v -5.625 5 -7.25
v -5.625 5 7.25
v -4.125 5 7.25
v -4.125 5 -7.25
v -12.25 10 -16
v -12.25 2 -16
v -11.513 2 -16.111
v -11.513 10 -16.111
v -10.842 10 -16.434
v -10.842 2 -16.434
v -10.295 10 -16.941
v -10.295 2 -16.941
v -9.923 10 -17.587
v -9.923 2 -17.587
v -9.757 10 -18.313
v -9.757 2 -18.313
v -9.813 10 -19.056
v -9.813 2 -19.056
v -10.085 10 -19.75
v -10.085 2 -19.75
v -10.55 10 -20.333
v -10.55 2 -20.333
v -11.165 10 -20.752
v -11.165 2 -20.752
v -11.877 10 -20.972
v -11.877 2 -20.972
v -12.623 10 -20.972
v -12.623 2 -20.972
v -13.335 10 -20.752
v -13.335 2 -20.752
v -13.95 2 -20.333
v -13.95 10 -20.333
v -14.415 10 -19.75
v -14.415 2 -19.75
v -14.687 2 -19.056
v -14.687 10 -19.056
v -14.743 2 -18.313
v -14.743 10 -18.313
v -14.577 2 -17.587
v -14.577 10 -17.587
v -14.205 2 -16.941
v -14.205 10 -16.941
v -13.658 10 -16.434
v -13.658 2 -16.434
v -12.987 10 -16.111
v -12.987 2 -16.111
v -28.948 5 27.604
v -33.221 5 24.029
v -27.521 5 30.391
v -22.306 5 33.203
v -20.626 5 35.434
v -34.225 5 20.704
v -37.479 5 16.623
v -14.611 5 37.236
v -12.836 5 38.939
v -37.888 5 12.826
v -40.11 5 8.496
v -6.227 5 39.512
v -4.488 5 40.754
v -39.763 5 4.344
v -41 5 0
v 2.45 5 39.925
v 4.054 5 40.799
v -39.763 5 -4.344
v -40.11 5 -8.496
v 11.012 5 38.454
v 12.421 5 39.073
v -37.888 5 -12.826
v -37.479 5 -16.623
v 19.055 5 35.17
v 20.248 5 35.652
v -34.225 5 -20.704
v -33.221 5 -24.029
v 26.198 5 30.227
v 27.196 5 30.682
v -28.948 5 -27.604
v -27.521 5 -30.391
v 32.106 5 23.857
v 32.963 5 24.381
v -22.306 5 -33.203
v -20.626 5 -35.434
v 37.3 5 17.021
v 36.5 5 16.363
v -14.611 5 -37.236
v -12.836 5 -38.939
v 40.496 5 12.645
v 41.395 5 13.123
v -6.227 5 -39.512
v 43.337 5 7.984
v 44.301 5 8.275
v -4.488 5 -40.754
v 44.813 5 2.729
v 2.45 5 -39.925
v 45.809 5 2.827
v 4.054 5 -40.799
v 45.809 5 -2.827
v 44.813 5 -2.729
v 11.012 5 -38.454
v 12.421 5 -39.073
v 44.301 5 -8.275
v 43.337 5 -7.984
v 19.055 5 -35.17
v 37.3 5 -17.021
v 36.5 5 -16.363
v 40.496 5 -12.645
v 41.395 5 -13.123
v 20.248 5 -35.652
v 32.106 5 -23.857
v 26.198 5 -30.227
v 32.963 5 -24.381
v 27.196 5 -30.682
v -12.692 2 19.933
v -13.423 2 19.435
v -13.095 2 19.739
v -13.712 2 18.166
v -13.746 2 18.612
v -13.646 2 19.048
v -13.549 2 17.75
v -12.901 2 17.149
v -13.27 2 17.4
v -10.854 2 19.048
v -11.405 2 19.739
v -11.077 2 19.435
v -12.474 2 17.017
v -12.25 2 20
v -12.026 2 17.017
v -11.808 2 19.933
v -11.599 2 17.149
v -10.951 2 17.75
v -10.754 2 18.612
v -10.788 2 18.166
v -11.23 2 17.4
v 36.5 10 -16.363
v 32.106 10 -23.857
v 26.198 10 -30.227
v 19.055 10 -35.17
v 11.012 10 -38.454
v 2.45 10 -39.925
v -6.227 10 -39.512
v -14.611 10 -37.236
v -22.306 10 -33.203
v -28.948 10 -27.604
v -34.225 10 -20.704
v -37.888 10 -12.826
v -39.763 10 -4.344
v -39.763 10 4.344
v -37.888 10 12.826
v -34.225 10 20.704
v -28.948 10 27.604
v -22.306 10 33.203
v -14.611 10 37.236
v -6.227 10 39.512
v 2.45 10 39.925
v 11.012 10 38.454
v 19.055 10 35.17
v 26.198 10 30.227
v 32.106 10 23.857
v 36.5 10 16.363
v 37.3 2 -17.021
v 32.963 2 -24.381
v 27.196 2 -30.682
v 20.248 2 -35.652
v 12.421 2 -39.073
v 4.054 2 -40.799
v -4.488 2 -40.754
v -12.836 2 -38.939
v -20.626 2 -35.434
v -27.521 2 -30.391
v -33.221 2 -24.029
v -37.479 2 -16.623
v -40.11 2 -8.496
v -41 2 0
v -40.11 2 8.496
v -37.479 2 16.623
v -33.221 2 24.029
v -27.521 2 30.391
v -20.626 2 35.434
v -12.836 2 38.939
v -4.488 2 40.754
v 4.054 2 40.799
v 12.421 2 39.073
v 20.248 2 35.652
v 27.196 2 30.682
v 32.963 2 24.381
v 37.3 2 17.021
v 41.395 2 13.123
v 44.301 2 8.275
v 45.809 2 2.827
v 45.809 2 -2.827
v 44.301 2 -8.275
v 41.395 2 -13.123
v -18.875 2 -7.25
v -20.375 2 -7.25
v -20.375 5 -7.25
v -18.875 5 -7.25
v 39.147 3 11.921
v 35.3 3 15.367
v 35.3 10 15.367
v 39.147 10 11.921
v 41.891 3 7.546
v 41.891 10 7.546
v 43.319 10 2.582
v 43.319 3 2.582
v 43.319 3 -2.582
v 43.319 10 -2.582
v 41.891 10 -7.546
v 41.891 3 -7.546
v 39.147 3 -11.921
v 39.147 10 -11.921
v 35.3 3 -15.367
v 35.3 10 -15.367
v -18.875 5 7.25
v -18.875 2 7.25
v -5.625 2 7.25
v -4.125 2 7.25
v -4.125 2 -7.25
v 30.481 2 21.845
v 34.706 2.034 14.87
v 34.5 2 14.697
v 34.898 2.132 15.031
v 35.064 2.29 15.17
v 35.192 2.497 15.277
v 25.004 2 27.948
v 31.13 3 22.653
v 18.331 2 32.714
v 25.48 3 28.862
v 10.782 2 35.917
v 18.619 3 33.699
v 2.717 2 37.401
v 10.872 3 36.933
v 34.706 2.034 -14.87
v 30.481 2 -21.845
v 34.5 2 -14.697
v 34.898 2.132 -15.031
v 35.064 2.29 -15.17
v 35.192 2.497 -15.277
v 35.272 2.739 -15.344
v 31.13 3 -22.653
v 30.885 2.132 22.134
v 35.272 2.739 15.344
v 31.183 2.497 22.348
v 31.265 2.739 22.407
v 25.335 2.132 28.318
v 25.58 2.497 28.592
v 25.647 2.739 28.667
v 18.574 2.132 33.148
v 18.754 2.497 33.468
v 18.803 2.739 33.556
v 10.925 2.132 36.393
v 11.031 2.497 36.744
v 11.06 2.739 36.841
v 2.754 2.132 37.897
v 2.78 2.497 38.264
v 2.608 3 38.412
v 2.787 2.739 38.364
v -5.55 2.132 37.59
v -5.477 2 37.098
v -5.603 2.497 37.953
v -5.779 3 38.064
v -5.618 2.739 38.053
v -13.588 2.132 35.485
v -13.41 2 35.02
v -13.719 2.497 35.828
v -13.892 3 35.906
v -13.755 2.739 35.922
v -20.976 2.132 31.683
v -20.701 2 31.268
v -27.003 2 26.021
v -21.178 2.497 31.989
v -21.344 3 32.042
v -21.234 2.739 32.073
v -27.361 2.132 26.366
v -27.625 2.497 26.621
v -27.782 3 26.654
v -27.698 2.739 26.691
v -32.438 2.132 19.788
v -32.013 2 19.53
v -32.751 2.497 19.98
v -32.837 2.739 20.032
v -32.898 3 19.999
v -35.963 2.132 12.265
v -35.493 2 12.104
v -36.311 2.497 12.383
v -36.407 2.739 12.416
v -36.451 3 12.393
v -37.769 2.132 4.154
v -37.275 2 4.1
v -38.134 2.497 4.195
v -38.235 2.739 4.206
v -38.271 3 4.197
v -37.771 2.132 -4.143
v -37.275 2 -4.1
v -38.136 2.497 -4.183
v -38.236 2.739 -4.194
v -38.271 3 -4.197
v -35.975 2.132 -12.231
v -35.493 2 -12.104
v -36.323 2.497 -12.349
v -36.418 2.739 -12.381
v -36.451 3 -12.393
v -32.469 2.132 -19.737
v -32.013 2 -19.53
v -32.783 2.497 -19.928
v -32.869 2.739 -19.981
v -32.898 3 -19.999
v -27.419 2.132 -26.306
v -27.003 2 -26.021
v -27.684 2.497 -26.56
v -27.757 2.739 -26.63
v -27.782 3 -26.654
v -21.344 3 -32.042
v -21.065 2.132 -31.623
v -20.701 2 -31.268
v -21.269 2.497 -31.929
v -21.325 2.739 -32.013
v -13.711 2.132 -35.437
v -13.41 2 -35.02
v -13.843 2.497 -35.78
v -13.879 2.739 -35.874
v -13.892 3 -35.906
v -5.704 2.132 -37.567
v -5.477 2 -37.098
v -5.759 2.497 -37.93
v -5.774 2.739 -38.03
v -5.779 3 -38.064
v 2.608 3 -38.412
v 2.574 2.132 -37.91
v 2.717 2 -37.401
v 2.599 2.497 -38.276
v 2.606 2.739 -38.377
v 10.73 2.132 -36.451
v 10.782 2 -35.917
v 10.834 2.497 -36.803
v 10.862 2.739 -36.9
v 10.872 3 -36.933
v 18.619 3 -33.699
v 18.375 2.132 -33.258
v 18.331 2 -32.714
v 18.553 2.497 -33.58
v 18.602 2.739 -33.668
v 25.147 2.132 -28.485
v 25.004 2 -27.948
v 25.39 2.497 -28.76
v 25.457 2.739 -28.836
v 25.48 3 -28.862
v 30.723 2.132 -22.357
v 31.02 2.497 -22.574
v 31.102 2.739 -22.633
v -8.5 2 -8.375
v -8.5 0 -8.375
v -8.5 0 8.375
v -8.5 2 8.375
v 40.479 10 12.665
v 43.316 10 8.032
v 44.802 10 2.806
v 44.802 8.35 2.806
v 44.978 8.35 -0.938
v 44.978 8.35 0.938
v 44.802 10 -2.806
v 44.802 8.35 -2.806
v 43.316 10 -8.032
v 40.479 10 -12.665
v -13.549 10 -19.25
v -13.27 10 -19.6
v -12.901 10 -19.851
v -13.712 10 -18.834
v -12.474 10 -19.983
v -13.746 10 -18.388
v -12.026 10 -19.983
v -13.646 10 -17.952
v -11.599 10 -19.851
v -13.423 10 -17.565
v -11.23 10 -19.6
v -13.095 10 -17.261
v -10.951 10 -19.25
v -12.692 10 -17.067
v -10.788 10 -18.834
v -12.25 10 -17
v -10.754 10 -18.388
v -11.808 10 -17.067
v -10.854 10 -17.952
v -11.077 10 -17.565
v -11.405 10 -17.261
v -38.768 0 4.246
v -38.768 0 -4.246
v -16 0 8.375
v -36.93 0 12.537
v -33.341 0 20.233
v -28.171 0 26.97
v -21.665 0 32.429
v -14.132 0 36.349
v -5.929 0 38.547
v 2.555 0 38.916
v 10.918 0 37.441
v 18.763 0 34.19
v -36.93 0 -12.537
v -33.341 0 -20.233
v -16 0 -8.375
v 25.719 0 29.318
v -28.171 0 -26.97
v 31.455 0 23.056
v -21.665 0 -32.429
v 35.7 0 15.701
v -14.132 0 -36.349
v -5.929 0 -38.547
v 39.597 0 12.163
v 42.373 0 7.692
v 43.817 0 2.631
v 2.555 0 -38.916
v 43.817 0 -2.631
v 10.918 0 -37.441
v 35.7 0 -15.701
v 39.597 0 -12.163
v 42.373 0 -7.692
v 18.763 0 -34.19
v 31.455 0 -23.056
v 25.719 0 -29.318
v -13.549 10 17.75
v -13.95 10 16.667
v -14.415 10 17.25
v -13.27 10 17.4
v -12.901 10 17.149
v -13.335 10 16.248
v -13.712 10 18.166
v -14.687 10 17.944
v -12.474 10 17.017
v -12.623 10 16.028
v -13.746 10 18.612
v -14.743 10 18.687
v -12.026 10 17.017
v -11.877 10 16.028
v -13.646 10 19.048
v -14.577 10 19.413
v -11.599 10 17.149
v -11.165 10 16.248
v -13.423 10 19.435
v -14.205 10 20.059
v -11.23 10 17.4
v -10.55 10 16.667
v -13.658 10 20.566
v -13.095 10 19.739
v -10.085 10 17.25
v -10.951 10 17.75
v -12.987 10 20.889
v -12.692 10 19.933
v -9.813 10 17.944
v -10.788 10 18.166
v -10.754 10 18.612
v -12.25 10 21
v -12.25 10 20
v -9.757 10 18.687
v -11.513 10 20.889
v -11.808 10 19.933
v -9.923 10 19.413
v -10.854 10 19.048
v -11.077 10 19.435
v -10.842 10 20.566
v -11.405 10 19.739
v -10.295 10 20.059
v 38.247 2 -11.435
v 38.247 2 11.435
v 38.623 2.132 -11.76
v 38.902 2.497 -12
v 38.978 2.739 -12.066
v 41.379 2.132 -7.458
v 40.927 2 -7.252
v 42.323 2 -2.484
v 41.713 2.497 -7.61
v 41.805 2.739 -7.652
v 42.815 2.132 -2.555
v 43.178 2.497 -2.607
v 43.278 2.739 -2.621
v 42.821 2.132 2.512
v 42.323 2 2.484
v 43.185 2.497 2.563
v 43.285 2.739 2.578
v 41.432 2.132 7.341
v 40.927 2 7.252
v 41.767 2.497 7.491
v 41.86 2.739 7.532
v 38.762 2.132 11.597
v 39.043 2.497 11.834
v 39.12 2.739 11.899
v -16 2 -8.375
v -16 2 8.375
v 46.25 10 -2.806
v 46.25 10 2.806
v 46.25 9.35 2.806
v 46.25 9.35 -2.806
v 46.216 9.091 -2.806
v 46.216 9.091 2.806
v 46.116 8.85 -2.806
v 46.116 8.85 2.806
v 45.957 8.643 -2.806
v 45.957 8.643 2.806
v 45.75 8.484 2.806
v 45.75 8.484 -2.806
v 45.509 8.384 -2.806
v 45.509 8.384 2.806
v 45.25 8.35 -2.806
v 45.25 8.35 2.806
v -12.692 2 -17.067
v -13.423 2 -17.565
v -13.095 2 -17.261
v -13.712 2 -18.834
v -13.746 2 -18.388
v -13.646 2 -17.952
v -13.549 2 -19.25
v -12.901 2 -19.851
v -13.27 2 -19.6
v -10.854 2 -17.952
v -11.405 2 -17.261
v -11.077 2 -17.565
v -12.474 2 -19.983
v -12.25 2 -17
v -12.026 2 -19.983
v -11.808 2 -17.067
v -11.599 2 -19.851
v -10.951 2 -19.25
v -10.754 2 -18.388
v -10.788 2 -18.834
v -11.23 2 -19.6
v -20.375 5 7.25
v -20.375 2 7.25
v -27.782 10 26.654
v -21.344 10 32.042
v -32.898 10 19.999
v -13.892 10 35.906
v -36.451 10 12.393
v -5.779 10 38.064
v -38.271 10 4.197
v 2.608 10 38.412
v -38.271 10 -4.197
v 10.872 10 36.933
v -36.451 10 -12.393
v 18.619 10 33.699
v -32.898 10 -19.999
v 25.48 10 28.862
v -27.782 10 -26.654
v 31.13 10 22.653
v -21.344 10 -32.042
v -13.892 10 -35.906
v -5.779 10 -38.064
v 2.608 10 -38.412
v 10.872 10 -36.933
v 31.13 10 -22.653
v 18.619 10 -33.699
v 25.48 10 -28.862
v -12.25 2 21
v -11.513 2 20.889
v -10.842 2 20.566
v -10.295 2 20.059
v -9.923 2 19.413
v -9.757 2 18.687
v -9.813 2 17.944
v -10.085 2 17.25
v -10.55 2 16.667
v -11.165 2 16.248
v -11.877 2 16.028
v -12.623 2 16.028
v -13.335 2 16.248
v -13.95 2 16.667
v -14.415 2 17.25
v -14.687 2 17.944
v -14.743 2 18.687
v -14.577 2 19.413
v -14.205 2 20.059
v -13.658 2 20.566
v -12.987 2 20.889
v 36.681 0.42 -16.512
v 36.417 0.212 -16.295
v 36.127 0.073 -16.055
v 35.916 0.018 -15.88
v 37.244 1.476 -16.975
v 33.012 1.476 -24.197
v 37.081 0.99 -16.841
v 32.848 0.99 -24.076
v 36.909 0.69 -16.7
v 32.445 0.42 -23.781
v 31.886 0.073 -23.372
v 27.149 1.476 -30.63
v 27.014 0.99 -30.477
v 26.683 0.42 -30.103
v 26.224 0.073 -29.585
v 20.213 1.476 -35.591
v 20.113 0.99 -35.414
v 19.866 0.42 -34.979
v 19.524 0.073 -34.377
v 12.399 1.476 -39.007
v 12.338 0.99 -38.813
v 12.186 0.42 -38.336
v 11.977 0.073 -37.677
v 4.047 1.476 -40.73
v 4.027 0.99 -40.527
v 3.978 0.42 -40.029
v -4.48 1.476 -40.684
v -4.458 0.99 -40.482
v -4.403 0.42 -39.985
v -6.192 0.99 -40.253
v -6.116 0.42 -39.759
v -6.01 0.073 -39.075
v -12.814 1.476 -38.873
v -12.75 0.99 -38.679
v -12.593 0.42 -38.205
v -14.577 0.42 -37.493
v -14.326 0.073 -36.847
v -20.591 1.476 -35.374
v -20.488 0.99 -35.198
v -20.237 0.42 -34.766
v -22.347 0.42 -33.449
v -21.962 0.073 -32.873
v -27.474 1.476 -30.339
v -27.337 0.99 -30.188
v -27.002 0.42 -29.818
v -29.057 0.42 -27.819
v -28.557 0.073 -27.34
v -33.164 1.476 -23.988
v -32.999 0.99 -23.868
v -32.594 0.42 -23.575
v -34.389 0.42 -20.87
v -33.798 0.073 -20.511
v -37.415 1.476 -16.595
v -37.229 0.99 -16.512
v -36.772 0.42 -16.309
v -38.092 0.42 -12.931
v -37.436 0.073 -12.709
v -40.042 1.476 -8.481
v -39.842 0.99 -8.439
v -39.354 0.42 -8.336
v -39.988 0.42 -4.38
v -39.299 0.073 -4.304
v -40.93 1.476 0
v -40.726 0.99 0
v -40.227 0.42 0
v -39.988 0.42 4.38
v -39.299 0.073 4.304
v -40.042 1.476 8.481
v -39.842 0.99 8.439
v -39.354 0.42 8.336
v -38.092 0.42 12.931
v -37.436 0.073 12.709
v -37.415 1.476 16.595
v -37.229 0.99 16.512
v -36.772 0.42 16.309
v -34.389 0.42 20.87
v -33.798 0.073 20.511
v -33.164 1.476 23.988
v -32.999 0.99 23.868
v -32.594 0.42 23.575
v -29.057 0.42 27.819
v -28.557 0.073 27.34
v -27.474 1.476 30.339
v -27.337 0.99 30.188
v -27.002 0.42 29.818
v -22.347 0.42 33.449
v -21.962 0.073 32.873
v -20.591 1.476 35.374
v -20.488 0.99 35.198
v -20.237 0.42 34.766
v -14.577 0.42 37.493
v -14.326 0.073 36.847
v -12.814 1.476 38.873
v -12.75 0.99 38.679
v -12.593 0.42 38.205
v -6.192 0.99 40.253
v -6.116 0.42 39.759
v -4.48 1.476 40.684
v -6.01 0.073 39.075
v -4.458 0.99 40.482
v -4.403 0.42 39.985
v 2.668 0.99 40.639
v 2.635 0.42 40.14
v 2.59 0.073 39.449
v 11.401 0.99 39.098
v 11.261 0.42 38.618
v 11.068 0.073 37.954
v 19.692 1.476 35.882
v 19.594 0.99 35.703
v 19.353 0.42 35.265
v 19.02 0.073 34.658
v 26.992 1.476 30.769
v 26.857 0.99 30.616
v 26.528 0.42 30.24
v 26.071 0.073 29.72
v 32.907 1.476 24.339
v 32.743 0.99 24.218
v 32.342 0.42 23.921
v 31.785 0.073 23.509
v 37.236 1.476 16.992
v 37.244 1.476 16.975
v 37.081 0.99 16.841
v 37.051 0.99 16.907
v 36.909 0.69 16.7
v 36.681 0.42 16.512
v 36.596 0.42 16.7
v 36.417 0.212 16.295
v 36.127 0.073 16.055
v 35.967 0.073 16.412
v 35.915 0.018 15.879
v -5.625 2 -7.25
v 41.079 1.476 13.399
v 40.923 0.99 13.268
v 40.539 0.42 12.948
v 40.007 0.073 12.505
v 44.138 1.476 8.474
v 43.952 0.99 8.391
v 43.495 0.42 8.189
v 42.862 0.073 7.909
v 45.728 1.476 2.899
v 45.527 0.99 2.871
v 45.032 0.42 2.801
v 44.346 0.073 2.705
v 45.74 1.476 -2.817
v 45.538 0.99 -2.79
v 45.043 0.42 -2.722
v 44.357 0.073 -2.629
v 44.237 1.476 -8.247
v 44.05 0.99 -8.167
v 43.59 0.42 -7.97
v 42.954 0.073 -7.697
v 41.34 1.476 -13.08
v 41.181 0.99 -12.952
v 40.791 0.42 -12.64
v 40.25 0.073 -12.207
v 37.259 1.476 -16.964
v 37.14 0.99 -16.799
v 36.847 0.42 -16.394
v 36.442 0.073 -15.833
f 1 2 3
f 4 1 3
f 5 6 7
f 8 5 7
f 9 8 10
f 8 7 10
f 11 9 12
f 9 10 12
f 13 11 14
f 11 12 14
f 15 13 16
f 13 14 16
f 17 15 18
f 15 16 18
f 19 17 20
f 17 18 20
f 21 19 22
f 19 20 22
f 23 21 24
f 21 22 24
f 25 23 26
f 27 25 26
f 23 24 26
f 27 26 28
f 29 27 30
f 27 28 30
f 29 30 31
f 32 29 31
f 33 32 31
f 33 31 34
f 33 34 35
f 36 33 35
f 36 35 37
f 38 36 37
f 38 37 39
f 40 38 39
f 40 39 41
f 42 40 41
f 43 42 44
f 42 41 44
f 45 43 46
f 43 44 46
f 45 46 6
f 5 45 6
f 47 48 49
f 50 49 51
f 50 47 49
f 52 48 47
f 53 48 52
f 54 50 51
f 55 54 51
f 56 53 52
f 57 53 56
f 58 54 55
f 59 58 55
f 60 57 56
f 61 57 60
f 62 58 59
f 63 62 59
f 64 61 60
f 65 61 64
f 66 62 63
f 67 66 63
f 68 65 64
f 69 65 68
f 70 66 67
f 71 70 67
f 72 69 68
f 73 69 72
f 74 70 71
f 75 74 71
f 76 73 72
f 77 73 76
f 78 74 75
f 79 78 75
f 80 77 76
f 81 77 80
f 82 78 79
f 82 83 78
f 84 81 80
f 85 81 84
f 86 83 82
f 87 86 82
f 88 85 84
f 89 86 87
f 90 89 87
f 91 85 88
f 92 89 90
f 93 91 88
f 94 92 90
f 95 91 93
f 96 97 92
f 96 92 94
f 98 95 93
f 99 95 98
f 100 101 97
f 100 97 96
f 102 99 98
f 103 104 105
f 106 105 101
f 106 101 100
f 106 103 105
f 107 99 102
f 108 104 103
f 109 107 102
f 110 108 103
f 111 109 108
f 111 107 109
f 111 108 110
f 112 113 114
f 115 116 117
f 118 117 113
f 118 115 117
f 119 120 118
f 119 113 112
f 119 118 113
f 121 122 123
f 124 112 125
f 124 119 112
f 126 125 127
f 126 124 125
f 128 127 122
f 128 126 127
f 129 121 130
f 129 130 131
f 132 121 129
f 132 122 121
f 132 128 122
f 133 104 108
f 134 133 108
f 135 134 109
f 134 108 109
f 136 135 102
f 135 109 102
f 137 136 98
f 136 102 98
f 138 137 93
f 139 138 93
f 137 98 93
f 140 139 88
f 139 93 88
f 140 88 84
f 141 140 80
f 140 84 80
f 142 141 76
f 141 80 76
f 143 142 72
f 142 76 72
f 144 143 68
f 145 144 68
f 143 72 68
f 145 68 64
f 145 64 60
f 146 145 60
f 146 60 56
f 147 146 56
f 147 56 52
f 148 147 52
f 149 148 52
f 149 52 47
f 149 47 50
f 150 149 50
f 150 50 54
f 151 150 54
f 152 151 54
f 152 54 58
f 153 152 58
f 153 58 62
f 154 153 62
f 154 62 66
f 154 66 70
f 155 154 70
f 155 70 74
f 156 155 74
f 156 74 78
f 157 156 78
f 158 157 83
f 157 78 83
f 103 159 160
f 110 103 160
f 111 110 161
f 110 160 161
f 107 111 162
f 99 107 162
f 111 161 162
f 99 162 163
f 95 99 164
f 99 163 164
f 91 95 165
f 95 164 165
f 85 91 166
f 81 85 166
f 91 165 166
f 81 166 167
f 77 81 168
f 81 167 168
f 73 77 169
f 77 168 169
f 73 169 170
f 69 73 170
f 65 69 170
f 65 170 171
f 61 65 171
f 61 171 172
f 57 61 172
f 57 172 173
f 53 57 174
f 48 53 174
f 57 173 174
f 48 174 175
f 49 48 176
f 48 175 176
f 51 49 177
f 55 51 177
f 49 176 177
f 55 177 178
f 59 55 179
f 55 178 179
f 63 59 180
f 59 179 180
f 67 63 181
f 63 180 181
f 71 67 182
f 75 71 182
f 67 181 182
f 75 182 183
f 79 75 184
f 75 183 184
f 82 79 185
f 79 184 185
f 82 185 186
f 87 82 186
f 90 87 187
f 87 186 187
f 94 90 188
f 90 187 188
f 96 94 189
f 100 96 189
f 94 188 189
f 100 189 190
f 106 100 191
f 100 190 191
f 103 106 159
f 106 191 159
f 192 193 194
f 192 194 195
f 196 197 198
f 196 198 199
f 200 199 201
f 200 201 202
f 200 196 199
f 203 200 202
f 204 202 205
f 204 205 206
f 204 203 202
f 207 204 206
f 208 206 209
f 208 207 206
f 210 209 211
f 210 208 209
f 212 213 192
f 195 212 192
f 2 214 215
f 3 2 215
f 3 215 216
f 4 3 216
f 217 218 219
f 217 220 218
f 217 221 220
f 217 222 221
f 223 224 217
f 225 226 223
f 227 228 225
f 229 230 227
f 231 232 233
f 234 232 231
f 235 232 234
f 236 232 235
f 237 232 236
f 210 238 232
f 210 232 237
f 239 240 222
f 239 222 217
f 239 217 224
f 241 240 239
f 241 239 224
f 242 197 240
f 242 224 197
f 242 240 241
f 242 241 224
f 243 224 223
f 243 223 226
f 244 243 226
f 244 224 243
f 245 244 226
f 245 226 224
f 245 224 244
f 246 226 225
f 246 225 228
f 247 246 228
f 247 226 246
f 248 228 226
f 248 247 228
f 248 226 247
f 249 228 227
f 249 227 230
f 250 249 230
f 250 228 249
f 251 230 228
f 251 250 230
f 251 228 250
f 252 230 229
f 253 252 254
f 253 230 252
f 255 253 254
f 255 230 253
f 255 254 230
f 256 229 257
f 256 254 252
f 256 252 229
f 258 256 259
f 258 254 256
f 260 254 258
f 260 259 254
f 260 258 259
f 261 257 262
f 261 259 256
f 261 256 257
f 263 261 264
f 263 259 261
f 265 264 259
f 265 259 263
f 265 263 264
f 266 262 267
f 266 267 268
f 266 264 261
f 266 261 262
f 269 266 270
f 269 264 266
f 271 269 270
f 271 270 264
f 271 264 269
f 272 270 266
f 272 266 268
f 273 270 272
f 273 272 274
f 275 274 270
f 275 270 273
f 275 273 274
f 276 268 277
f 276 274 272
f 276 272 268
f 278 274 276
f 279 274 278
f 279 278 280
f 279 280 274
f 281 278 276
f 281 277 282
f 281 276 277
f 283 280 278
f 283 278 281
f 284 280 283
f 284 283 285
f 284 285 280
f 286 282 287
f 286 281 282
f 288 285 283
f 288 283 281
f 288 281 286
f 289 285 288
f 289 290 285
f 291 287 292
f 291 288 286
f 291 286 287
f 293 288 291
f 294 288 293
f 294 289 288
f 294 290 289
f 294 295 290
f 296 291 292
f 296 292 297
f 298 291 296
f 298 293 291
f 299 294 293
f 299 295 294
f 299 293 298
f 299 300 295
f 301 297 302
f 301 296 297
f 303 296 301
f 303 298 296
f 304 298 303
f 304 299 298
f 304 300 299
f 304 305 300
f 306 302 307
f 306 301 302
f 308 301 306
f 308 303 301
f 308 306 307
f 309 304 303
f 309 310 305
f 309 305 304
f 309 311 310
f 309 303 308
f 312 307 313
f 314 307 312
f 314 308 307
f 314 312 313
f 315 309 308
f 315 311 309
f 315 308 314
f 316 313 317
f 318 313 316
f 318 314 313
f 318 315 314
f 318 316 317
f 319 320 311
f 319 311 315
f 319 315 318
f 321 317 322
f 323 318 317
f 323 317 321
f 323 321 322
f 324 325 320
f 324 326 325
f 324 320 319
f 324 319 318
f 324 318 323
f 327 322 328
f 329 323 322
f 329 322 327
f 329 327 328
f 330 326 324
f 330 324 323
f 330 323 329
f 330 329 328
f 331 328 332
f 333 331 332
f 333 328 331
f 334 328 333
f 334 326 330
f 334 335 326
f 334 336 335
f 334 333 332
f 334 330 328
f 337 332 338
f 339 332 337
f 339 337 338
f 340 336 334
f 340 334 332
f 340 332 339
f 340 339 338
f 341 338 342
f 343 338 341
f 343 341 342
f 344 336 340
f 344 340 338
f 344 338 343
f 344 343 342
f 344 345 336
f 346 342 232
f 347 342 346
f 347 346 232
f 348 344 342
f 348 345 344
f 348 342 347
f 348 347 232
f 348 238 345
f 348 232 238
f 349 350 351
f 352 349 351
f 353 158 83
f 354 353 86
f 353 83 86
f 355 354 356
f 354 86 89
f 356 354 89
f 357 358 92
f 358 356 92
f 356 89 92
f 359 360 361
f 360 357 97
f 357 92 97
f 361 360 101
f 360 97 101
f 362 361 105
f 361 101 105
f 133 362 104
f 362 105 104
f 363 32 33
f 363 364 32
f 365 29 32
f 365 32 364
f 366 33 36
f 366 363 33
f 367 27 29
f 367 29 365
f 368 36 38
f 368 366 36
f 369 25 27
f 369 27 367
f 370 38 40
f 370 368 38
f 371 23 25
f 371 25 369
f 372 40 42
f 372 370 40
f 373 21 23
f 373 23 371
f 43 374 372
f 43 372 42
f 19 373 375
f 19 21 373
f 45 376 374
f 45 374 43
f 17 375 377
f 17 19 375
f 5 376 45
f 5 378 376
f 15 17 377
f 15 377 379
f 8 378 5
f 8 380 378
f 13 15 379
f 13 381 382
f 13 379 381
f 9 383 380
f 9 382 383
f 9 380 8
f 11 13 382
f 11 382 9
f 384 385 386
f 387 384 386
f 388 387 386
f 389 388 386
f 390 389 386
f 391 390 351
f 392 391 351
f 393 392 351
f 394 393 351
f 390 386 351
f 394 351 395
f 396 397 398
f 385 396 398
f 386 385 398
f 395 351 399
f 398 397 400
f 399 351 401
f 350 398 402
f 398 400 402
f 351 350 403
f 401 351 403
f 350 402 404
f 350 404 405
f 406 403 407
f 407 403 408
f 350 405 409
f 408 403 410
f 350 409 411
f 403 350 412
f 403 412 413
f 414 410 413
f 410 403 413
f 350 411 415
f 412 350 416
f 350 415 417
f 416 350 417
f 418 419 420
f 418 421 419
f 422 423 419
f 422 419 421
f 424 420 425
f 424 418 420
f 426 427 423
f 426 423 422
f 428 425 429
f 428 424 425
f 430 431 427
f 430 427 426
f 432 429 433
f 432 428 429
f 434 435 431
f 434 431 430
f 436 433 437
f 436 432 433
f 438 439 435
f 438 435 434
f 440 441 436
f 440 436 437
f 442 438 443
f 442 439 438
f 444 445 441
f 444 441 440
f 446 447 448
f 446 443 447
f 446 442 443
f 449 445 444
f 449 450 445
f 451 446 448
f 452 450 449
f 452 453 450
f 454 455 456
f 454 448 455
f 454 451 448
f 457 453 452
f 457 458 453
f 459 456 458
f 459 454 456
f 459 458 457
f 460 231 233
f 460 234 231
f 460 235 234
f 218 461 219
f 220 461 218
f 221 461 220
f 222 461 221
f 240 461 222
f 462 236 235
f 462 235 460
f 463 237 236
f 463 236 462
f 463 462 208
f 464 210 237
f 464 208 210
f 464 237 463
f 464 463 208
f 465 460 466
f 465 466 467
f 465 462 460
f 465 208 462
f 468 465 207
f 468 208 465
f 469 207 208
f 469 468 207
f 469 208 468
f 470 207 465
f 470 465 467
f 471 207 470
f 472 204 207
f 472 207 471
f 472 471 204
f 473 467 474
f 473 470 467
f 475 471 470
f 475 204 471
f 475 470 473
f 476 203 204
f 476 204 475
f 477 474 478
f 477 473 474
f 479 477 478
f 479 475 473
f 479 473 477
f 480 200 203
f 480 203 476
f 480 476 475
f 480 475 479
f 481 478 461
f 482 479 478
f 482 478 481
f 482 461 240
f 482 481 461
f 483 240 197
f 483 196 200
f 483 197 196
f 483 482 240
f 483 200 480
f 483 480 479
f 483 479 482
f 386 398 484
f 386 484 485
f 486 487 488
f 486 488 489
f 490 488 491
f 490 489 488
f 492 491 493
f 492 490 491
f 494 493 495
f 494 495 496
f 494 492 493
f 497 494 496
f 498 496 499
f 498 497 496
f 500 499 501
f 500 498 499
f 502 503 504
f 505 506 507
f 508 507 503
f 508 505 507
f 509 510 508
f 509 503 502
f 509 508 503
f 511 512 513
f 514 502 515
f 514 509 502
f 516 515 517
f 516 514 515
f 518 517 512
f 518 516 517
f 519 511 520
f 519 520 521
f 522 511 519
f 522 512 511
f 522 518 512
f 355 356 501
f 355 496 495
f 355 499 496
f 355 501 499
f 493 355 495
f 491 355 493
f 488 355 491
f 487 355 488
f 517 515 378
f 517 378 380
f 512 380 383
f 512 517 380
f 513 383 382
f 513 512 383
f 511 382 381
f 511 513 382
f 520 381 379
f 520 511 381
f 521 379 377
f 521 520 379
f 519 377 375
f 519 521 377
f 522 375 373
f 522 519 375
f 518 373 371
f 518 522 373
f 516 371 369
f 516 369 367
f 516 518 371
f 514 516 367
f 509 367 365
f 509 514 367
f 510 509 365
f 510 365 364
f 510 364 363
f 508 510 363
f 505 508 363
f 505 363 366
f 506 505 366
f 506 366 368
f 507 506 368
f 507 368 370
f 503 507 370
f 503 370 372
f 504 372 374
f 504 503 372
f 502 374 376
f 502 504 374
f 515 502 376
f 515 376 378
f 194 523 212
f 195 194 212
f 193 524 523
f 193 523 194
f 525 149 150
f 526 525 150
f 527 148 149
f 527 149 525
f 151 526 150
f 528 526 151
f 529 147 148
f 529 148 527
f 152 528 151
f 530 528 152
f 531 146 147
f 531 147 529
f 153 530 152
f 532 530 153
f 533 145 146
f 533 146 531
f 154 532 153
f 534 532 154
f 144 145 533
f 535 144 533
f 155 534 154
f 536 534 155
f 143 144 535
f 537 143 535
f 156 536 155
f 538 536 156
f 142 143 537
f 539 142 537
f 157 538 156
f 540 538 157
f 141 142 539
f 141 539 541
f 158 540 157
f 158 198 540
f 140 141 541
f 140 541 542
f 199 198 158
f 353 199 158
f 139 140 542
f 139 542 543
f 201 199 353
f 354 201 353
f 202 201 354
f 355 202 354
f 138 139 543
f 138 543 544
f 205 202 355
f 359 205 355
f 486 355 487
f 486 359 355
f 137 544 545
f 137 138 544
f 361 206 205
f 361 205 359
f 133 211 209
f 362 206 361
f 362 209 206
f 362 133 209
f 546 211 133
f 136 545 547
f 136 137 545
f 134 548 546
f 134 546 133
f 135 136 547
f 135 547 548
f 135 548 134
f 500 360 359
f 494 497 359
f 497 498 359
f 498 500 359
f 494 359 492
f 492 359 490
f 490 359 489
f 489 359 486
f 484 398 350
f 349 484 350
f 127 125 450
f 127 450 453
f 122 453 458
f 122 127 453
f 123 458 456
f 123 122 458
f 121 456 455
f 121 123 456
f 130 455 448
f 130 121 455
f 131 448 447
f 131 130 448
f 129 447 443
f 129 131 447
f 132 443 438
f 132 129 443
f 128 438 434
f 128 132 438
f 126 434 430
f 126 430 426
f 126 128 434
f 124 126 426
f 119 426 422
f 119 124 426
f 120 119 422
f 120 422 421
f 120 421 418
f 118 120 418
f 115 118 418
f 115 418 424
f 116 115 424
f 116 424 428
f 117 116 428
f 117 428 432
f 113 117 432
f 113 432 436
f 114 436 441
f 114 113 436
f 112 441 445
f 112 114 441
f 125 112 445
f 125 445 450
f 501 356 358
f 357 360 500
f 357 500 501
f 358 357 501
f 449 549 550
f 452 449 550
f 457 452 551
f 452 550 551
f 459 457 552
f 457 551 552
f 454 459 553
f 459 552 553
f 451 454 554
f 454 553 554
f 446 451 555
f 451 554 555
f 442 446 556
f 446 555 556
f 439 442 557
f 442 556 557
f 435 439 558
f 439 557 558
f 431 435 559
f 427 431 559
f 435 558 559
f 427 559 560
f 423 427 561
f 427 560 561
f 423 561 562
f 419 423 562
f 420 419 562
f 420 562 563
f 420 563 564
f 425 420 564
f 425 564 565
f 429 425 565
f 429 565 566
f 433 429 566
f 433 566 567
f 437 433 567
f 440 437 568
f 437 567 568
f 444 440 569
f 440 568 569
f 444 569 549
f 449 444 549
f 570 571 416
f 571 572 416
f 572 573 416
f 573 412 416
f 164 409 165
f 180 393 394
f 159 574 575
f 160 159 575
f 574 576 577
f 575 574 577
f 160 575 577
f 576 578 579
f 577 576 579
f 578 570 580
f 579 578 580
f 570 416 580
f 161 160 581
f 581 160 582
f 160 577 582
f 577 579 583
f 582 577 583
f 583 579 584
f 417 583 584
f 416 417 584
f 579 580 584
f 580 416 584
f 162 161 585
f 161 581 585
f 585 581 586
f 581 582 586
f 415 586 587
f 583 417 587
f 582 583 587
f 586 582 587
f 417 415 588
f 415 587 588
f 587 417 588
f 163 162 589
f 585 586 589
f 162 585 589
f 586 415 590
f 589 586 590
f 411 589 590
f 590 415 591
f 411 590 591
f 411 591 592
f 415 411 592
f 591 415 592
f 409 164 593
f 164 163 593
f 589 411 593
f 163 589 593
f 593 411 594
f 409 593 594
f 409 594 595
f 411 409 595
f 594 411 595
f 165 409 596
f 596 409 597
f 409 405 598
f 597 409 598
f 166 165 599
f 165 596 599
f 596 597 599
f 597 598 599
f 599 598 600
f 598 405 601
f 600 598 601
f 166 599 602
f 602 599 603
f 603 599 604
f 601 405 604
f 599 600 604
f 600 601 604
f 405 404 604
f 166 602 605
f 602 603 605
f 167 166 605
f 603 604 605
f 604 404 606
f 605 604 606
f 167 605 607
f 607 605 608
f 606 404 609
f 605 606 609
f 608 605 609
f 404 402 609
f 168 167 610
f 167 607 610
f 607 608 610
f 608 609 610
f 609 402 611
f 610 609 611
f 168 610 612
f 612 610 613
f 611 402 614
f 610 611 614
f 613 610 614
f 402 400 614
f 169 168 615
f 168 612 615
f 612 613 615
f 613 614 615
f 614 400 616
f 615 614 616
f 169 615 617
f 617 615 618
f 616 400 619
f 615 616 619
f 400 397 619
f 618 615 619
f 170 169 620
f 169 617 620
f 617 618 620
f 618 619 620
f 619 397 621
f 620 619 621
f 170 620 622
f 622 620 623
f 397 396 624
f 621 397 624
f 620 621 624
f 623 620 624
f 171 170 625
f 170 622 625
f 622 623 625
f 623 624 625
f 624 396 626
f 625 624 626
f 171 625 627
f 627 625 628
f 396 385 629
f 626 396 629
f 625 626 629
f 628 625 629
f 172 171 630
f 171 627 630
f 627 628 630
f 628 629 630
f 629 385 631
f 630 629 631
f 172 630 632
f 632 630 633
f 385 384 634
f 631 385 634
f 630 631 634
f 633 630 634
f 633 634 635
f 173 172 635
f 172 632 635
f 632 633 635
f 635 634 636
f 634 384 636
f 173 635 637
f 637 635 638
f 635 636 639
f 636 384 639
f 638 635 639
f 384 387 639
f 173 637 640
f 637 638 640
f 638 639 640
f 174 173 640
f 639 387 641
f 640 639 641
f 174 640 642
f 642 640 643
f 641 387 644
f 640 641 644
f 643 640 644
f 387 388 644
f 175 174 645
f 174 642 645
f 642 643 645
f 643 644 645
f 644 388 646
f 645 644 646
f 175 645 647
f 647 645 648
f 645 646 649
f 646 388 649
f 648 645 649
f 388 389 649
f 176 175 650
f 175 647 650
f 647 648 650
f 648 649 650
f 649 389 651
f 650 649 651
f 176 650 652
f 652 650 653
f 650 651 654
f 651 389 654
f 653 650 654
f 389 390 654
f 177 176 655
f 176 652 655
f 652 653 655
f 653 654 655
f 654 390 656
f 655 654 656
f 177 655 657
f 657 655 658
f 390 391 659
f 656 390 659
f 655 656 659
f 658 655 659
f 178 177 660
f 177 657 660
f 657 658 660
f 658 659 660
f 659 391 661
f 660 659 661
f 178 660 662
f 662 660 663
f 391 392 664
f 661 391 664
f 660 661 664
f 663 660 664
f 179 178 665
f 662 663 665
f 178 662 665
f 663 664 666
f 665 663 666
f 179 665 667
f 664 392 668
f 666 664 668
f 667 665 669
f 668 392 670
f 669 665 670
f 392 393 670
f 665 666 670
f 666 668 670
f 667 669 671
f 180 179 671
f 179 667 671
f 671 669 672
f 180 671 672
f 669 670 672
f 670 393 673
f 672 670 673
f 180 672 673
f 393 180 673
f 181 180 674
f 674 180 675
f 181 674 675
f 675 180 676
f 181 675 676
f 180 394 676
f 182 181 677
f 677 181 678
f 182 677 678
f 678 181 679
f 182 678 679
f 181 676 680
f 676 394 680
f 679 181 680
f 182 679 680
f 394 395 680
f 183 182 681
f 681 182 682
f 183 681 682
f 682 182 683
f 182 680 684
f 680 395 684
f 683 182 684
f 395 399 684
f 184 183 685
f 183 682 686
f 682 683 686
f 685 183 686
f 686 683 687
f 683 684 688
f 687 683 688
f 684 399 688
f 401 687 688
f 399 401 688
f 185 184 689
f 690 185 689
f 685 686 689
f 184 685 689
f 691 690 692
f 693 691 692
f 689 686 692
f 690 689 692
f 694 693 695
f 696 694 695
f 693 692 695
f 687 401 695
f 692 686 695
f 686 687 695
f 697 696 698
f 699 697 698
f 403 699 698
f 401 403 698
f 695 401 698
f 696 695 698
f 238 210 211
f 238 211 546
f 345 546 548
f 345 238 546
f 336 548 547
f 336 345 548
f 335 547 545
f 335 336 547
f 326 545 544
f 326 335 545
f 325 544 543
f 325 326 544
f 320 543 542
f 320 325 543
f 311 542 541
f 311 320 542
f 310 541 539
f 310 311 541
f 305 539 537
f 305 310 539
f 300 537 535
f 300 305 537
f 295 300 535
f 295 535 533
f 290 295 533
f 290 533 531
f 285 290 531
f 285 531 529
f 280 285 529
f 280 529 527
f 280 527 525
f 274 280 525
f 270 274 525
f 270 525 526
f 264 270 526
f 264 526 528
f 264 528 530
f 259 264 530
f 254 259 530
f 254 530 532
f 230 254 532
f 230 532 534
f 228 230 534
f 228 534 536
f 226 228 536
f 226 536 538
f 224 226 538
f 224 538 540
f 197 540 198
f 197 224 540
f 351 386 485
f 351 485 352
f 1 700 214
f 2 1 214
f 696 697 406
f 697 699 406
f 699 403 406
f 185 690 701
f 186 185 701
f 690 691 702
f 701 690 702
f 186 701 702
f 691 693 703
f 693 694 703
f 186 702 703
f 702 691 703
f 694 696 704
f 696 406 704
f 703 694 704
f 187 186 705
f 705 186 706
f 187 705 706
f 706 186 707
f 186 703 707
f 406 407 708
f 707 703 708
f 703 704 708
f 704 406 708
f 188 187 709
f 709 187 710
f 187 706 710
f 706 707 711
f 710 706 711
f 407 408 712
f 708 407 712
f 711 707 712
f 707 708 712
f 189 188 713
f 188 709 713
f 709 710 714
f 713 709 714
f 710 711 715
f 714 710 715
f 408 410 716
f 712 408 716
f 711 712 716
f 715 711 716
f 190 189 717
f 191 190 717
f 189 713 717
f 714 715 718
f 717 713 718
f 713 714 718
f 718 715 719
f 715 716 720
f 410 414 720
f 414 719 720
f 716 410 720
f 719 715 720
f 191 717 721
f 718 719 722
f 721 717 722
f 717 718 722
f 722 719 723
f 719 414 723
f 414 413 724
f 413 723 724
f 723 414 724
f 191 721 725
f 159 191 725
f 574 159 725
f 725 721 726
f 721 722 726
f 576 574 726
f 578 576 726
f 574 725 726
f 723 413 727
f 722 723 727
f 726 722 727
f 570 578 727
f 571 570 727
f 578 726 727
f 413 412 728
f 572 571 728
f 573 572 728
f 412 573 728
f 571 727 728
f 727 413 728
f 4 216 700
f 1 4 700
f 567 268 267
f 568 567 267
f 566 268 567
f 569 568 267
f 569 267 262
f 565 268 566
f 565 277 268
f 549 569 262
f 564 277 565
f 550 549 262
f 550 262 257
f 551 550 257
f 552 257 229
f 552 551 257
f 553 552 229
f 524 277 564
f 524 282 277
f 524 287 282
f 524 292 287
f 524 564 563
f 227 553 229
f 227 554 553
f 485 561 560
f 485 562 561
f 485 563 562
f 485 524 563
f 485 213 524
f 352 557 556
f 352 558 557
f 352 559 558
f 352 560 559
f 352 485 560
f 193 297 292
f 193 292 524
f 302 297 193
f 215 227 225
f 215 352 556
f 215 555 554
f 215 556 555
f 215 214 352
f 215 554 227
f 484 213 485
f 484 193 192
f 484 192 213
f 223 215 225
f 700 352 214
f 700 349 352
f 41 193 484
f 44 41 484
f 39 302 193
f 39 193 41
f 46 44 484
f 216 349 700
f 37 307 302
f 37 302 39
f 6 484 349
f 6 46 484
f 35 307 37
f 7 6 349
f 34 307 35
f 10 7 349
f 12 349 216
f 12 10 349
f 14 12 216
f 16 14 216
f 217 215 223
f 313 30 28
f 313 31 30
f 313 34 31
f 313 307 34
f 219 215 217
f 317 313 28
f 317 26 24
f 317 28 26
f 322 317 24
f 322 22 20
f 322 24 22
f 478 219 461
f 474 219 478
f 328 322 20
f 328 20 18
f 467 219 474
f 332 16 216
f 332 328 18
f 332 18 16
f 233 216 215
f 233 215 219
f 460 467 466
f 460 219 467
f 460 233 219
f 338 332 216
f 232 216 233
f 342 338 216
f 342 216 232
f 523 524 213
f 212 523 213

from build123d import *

# Parameters (mm, degrees)
BOSS_EXTRUDE3_DEPTH = 2
BOSS_EXTRUDE4_DEPTH = 10
BOSS_EXTRUDE5_DEPTH = 5
SKETCH11_W          = 2.5
SKETCH11_H          = 5.612132728
BOSS_EXTRUDE7_DEPTH = 1.65
FILLET2_R           = 1
SKETCH12_W          = 7.5
SKETCH12_H          = 16.75
CUT_EXTRUDE1_DEPTH  = 2
SKETCH17_W          = 1.5
SKETCH17_H          = 14.5
BOSS_EXTRUDE8_DEPTH = 3
SKETCH18_R          = 2.5
SKETCH18_R_2        = 1.5
BOSS_EXTRUDE9_DEPTH = 8
FILLET3_R           = 2
FILLET4_R           = 1


with BuildPart() as part:
    # Sketch4 → Boss-Extrude3 (new body)
    with BuildSketch(Plane(origin=(0, 0, 0), x_dir=(1, 0, 0), z_dir=(0, 1, 0))):
        with BuildLine():
            ThreePointArc((37.3, 17.020869543), (-41, 0), (37.3, -17.020869543))
            ThreePointArc((37.3, -17.020869543), (46, 0), (37.3, 17.020869543))
        make_face()
    extrude(amount=BOSS_EXTRUDE3_DEPTH)

    # Sketch4<5> → Boss-Extrude4 (add)
    with BuildSketch(Plane(origin=(0, 0, 0), x_dir=(1, 0, 0), z_dir=(0, 1, 0))):
        with BuildLine():
            ThreePointArc((36.5, 16.363068172), (-40, 0), (36.5, -16.363068172))
            ThreePointArc((36.5, -16.363068172), (45, 0), (36.5, 16.363068172))
        make_face()
        with BuildLine():
            ThreePointArc((35.3, -15.36749817), (43.5, 0), (35.3, 15.36749817))
            ThreePointArc((35.3, 15.36749817), (-38.5, 0), (35.3, -15.36749817))
        make_face(mode=Mode.SUBTRACT)
    extrude(amount=BOSS_EXTRUDE4_DEPTH)

    # Sketch4<6> → Boss-Extrude5 (add)
    with BuildSketch(Plane(origin=(0, 0, 0), x_dir=(1, 0, 0), z_dir=(0, 1, 0))):
        with BuildLine():
            ThreePointArc((37.3, 17.020869543), (-41, 0), (37.3, -17.020869543))
            ThreePointArc((37.3, -17.020869543), (46, 0), (37.3, 17.020869543))
        make_face()
        with BuildLine():
            ThreePointArc((36.5, -16.363068172), (45, 0), (36.5, 16.363068172))
            ThreePointArc((36.5, 16.363068172), (-40, 0), (36.5, -16.363068172))
        make_face(mode=Mode.SUBTRACT)
    extrude(amount=BOSS_EXTRUDE5_DEPTH)

    # Sketch11 → Boss-Extrude7 (add)
    with BuildSketch(Plane(origin=(0, 10, 0), x_dir=(1, 0, 0), z_dir=(0, 1, 0))):
        with Locations((45, 0)):
            Rectangle(SKETCH11_W, SKETCH11_H)
    extrude(amount=-BOSS_EXTRUDE7_DEPTH)

    # Fillet2
    fillet2_edges = [part.edges().sort_by_distance(p)[0] for p in [
        (46.25, 8.35, 0),
    ]]
    fillet(fillet2_edges, radius=FILLET2_R)

    # Sketch12 → Cut-Extrude1 (cut)
    with BuildSketch(Plane.XZ):
        with Locations((-12.25, 0)):
            Rectangle(SKETCH12_W, SKETCH12_H)
    extrude(amount=-CUT_EXTRUDE1_DEPTH, mode=Mode.SUBTRACT)

    # Sketch17 → Boss-Extrude8 (add)
    with BuildSketch(Plane(origin=(0, 2, 0), x_dir=(1, 0, 0), z_dir=(0, 1, 0))):
        Polygon((-5.625, 0), (-5.625, -7.25), (-4.125, -7.25), (-4.125, 7.25), (-5.625, 7.25), align=None)
        with Locations((-19.625, 0)):
            Rectangle(SKETCH17_W, SKETCH17_H)
    extrude(amount=BOSS_EXTRUDE8_DEPTH)

    # Sketch18 → Boss-Extrude9 (add)
    # profile 1 of 2: a face of its own
    with BuildSketch(Plane(origin=(0, 2, 0), x_dir=(1, 0, 0), z_dir=(0, 1, 0))):
        with Locations(Location((-12.25, -18.5, 0), (0, 0, 270))):
            Circle(SKETCH18_R)
        with Locations(Location((-12.25, -18.5, 0), (0, 0, 270))):
            Circle(SKETCH18_R_2, mode=Mode.SUBTRACT)
    # profile 2 of 2: a face of its own
    with BuildSketch(Plane(origin=(0, 2, 0), x_dir=(1, 0, 0), z_dir=(0, 1, 0))):
        with Locations(Location((-12.25, 18.5, 0), (0, 0, 270))):
            Circle(SKETCH18_R)
        with Locations(Location((-12.25, 18.5, 0), (0, 0, 270))):
            Circle(SKETCH18_R_2, mode=Mode.SUBTRACT)
    extrude(amount=BOSS_EXTRUDE9_DEPTH)

    # Fillet3
    fillet3_edges = [part.edges().sort_by_distance(p)[0] for p in [
        (46, 0, 0),
        (-41, 0, 0),
    ]]
    fillet(fillet3_edges, radius=FILLET3_R)

    # Fillet4
    fillet4_edges = [part.edges().sort_by_distance(p)[0] for p in [
        (43.5, 2, 0),
        (-38.5, 2, 0),
    ]]
    fillet(fillet4_edges, radius=FILLET4_R)


solid = part.part
